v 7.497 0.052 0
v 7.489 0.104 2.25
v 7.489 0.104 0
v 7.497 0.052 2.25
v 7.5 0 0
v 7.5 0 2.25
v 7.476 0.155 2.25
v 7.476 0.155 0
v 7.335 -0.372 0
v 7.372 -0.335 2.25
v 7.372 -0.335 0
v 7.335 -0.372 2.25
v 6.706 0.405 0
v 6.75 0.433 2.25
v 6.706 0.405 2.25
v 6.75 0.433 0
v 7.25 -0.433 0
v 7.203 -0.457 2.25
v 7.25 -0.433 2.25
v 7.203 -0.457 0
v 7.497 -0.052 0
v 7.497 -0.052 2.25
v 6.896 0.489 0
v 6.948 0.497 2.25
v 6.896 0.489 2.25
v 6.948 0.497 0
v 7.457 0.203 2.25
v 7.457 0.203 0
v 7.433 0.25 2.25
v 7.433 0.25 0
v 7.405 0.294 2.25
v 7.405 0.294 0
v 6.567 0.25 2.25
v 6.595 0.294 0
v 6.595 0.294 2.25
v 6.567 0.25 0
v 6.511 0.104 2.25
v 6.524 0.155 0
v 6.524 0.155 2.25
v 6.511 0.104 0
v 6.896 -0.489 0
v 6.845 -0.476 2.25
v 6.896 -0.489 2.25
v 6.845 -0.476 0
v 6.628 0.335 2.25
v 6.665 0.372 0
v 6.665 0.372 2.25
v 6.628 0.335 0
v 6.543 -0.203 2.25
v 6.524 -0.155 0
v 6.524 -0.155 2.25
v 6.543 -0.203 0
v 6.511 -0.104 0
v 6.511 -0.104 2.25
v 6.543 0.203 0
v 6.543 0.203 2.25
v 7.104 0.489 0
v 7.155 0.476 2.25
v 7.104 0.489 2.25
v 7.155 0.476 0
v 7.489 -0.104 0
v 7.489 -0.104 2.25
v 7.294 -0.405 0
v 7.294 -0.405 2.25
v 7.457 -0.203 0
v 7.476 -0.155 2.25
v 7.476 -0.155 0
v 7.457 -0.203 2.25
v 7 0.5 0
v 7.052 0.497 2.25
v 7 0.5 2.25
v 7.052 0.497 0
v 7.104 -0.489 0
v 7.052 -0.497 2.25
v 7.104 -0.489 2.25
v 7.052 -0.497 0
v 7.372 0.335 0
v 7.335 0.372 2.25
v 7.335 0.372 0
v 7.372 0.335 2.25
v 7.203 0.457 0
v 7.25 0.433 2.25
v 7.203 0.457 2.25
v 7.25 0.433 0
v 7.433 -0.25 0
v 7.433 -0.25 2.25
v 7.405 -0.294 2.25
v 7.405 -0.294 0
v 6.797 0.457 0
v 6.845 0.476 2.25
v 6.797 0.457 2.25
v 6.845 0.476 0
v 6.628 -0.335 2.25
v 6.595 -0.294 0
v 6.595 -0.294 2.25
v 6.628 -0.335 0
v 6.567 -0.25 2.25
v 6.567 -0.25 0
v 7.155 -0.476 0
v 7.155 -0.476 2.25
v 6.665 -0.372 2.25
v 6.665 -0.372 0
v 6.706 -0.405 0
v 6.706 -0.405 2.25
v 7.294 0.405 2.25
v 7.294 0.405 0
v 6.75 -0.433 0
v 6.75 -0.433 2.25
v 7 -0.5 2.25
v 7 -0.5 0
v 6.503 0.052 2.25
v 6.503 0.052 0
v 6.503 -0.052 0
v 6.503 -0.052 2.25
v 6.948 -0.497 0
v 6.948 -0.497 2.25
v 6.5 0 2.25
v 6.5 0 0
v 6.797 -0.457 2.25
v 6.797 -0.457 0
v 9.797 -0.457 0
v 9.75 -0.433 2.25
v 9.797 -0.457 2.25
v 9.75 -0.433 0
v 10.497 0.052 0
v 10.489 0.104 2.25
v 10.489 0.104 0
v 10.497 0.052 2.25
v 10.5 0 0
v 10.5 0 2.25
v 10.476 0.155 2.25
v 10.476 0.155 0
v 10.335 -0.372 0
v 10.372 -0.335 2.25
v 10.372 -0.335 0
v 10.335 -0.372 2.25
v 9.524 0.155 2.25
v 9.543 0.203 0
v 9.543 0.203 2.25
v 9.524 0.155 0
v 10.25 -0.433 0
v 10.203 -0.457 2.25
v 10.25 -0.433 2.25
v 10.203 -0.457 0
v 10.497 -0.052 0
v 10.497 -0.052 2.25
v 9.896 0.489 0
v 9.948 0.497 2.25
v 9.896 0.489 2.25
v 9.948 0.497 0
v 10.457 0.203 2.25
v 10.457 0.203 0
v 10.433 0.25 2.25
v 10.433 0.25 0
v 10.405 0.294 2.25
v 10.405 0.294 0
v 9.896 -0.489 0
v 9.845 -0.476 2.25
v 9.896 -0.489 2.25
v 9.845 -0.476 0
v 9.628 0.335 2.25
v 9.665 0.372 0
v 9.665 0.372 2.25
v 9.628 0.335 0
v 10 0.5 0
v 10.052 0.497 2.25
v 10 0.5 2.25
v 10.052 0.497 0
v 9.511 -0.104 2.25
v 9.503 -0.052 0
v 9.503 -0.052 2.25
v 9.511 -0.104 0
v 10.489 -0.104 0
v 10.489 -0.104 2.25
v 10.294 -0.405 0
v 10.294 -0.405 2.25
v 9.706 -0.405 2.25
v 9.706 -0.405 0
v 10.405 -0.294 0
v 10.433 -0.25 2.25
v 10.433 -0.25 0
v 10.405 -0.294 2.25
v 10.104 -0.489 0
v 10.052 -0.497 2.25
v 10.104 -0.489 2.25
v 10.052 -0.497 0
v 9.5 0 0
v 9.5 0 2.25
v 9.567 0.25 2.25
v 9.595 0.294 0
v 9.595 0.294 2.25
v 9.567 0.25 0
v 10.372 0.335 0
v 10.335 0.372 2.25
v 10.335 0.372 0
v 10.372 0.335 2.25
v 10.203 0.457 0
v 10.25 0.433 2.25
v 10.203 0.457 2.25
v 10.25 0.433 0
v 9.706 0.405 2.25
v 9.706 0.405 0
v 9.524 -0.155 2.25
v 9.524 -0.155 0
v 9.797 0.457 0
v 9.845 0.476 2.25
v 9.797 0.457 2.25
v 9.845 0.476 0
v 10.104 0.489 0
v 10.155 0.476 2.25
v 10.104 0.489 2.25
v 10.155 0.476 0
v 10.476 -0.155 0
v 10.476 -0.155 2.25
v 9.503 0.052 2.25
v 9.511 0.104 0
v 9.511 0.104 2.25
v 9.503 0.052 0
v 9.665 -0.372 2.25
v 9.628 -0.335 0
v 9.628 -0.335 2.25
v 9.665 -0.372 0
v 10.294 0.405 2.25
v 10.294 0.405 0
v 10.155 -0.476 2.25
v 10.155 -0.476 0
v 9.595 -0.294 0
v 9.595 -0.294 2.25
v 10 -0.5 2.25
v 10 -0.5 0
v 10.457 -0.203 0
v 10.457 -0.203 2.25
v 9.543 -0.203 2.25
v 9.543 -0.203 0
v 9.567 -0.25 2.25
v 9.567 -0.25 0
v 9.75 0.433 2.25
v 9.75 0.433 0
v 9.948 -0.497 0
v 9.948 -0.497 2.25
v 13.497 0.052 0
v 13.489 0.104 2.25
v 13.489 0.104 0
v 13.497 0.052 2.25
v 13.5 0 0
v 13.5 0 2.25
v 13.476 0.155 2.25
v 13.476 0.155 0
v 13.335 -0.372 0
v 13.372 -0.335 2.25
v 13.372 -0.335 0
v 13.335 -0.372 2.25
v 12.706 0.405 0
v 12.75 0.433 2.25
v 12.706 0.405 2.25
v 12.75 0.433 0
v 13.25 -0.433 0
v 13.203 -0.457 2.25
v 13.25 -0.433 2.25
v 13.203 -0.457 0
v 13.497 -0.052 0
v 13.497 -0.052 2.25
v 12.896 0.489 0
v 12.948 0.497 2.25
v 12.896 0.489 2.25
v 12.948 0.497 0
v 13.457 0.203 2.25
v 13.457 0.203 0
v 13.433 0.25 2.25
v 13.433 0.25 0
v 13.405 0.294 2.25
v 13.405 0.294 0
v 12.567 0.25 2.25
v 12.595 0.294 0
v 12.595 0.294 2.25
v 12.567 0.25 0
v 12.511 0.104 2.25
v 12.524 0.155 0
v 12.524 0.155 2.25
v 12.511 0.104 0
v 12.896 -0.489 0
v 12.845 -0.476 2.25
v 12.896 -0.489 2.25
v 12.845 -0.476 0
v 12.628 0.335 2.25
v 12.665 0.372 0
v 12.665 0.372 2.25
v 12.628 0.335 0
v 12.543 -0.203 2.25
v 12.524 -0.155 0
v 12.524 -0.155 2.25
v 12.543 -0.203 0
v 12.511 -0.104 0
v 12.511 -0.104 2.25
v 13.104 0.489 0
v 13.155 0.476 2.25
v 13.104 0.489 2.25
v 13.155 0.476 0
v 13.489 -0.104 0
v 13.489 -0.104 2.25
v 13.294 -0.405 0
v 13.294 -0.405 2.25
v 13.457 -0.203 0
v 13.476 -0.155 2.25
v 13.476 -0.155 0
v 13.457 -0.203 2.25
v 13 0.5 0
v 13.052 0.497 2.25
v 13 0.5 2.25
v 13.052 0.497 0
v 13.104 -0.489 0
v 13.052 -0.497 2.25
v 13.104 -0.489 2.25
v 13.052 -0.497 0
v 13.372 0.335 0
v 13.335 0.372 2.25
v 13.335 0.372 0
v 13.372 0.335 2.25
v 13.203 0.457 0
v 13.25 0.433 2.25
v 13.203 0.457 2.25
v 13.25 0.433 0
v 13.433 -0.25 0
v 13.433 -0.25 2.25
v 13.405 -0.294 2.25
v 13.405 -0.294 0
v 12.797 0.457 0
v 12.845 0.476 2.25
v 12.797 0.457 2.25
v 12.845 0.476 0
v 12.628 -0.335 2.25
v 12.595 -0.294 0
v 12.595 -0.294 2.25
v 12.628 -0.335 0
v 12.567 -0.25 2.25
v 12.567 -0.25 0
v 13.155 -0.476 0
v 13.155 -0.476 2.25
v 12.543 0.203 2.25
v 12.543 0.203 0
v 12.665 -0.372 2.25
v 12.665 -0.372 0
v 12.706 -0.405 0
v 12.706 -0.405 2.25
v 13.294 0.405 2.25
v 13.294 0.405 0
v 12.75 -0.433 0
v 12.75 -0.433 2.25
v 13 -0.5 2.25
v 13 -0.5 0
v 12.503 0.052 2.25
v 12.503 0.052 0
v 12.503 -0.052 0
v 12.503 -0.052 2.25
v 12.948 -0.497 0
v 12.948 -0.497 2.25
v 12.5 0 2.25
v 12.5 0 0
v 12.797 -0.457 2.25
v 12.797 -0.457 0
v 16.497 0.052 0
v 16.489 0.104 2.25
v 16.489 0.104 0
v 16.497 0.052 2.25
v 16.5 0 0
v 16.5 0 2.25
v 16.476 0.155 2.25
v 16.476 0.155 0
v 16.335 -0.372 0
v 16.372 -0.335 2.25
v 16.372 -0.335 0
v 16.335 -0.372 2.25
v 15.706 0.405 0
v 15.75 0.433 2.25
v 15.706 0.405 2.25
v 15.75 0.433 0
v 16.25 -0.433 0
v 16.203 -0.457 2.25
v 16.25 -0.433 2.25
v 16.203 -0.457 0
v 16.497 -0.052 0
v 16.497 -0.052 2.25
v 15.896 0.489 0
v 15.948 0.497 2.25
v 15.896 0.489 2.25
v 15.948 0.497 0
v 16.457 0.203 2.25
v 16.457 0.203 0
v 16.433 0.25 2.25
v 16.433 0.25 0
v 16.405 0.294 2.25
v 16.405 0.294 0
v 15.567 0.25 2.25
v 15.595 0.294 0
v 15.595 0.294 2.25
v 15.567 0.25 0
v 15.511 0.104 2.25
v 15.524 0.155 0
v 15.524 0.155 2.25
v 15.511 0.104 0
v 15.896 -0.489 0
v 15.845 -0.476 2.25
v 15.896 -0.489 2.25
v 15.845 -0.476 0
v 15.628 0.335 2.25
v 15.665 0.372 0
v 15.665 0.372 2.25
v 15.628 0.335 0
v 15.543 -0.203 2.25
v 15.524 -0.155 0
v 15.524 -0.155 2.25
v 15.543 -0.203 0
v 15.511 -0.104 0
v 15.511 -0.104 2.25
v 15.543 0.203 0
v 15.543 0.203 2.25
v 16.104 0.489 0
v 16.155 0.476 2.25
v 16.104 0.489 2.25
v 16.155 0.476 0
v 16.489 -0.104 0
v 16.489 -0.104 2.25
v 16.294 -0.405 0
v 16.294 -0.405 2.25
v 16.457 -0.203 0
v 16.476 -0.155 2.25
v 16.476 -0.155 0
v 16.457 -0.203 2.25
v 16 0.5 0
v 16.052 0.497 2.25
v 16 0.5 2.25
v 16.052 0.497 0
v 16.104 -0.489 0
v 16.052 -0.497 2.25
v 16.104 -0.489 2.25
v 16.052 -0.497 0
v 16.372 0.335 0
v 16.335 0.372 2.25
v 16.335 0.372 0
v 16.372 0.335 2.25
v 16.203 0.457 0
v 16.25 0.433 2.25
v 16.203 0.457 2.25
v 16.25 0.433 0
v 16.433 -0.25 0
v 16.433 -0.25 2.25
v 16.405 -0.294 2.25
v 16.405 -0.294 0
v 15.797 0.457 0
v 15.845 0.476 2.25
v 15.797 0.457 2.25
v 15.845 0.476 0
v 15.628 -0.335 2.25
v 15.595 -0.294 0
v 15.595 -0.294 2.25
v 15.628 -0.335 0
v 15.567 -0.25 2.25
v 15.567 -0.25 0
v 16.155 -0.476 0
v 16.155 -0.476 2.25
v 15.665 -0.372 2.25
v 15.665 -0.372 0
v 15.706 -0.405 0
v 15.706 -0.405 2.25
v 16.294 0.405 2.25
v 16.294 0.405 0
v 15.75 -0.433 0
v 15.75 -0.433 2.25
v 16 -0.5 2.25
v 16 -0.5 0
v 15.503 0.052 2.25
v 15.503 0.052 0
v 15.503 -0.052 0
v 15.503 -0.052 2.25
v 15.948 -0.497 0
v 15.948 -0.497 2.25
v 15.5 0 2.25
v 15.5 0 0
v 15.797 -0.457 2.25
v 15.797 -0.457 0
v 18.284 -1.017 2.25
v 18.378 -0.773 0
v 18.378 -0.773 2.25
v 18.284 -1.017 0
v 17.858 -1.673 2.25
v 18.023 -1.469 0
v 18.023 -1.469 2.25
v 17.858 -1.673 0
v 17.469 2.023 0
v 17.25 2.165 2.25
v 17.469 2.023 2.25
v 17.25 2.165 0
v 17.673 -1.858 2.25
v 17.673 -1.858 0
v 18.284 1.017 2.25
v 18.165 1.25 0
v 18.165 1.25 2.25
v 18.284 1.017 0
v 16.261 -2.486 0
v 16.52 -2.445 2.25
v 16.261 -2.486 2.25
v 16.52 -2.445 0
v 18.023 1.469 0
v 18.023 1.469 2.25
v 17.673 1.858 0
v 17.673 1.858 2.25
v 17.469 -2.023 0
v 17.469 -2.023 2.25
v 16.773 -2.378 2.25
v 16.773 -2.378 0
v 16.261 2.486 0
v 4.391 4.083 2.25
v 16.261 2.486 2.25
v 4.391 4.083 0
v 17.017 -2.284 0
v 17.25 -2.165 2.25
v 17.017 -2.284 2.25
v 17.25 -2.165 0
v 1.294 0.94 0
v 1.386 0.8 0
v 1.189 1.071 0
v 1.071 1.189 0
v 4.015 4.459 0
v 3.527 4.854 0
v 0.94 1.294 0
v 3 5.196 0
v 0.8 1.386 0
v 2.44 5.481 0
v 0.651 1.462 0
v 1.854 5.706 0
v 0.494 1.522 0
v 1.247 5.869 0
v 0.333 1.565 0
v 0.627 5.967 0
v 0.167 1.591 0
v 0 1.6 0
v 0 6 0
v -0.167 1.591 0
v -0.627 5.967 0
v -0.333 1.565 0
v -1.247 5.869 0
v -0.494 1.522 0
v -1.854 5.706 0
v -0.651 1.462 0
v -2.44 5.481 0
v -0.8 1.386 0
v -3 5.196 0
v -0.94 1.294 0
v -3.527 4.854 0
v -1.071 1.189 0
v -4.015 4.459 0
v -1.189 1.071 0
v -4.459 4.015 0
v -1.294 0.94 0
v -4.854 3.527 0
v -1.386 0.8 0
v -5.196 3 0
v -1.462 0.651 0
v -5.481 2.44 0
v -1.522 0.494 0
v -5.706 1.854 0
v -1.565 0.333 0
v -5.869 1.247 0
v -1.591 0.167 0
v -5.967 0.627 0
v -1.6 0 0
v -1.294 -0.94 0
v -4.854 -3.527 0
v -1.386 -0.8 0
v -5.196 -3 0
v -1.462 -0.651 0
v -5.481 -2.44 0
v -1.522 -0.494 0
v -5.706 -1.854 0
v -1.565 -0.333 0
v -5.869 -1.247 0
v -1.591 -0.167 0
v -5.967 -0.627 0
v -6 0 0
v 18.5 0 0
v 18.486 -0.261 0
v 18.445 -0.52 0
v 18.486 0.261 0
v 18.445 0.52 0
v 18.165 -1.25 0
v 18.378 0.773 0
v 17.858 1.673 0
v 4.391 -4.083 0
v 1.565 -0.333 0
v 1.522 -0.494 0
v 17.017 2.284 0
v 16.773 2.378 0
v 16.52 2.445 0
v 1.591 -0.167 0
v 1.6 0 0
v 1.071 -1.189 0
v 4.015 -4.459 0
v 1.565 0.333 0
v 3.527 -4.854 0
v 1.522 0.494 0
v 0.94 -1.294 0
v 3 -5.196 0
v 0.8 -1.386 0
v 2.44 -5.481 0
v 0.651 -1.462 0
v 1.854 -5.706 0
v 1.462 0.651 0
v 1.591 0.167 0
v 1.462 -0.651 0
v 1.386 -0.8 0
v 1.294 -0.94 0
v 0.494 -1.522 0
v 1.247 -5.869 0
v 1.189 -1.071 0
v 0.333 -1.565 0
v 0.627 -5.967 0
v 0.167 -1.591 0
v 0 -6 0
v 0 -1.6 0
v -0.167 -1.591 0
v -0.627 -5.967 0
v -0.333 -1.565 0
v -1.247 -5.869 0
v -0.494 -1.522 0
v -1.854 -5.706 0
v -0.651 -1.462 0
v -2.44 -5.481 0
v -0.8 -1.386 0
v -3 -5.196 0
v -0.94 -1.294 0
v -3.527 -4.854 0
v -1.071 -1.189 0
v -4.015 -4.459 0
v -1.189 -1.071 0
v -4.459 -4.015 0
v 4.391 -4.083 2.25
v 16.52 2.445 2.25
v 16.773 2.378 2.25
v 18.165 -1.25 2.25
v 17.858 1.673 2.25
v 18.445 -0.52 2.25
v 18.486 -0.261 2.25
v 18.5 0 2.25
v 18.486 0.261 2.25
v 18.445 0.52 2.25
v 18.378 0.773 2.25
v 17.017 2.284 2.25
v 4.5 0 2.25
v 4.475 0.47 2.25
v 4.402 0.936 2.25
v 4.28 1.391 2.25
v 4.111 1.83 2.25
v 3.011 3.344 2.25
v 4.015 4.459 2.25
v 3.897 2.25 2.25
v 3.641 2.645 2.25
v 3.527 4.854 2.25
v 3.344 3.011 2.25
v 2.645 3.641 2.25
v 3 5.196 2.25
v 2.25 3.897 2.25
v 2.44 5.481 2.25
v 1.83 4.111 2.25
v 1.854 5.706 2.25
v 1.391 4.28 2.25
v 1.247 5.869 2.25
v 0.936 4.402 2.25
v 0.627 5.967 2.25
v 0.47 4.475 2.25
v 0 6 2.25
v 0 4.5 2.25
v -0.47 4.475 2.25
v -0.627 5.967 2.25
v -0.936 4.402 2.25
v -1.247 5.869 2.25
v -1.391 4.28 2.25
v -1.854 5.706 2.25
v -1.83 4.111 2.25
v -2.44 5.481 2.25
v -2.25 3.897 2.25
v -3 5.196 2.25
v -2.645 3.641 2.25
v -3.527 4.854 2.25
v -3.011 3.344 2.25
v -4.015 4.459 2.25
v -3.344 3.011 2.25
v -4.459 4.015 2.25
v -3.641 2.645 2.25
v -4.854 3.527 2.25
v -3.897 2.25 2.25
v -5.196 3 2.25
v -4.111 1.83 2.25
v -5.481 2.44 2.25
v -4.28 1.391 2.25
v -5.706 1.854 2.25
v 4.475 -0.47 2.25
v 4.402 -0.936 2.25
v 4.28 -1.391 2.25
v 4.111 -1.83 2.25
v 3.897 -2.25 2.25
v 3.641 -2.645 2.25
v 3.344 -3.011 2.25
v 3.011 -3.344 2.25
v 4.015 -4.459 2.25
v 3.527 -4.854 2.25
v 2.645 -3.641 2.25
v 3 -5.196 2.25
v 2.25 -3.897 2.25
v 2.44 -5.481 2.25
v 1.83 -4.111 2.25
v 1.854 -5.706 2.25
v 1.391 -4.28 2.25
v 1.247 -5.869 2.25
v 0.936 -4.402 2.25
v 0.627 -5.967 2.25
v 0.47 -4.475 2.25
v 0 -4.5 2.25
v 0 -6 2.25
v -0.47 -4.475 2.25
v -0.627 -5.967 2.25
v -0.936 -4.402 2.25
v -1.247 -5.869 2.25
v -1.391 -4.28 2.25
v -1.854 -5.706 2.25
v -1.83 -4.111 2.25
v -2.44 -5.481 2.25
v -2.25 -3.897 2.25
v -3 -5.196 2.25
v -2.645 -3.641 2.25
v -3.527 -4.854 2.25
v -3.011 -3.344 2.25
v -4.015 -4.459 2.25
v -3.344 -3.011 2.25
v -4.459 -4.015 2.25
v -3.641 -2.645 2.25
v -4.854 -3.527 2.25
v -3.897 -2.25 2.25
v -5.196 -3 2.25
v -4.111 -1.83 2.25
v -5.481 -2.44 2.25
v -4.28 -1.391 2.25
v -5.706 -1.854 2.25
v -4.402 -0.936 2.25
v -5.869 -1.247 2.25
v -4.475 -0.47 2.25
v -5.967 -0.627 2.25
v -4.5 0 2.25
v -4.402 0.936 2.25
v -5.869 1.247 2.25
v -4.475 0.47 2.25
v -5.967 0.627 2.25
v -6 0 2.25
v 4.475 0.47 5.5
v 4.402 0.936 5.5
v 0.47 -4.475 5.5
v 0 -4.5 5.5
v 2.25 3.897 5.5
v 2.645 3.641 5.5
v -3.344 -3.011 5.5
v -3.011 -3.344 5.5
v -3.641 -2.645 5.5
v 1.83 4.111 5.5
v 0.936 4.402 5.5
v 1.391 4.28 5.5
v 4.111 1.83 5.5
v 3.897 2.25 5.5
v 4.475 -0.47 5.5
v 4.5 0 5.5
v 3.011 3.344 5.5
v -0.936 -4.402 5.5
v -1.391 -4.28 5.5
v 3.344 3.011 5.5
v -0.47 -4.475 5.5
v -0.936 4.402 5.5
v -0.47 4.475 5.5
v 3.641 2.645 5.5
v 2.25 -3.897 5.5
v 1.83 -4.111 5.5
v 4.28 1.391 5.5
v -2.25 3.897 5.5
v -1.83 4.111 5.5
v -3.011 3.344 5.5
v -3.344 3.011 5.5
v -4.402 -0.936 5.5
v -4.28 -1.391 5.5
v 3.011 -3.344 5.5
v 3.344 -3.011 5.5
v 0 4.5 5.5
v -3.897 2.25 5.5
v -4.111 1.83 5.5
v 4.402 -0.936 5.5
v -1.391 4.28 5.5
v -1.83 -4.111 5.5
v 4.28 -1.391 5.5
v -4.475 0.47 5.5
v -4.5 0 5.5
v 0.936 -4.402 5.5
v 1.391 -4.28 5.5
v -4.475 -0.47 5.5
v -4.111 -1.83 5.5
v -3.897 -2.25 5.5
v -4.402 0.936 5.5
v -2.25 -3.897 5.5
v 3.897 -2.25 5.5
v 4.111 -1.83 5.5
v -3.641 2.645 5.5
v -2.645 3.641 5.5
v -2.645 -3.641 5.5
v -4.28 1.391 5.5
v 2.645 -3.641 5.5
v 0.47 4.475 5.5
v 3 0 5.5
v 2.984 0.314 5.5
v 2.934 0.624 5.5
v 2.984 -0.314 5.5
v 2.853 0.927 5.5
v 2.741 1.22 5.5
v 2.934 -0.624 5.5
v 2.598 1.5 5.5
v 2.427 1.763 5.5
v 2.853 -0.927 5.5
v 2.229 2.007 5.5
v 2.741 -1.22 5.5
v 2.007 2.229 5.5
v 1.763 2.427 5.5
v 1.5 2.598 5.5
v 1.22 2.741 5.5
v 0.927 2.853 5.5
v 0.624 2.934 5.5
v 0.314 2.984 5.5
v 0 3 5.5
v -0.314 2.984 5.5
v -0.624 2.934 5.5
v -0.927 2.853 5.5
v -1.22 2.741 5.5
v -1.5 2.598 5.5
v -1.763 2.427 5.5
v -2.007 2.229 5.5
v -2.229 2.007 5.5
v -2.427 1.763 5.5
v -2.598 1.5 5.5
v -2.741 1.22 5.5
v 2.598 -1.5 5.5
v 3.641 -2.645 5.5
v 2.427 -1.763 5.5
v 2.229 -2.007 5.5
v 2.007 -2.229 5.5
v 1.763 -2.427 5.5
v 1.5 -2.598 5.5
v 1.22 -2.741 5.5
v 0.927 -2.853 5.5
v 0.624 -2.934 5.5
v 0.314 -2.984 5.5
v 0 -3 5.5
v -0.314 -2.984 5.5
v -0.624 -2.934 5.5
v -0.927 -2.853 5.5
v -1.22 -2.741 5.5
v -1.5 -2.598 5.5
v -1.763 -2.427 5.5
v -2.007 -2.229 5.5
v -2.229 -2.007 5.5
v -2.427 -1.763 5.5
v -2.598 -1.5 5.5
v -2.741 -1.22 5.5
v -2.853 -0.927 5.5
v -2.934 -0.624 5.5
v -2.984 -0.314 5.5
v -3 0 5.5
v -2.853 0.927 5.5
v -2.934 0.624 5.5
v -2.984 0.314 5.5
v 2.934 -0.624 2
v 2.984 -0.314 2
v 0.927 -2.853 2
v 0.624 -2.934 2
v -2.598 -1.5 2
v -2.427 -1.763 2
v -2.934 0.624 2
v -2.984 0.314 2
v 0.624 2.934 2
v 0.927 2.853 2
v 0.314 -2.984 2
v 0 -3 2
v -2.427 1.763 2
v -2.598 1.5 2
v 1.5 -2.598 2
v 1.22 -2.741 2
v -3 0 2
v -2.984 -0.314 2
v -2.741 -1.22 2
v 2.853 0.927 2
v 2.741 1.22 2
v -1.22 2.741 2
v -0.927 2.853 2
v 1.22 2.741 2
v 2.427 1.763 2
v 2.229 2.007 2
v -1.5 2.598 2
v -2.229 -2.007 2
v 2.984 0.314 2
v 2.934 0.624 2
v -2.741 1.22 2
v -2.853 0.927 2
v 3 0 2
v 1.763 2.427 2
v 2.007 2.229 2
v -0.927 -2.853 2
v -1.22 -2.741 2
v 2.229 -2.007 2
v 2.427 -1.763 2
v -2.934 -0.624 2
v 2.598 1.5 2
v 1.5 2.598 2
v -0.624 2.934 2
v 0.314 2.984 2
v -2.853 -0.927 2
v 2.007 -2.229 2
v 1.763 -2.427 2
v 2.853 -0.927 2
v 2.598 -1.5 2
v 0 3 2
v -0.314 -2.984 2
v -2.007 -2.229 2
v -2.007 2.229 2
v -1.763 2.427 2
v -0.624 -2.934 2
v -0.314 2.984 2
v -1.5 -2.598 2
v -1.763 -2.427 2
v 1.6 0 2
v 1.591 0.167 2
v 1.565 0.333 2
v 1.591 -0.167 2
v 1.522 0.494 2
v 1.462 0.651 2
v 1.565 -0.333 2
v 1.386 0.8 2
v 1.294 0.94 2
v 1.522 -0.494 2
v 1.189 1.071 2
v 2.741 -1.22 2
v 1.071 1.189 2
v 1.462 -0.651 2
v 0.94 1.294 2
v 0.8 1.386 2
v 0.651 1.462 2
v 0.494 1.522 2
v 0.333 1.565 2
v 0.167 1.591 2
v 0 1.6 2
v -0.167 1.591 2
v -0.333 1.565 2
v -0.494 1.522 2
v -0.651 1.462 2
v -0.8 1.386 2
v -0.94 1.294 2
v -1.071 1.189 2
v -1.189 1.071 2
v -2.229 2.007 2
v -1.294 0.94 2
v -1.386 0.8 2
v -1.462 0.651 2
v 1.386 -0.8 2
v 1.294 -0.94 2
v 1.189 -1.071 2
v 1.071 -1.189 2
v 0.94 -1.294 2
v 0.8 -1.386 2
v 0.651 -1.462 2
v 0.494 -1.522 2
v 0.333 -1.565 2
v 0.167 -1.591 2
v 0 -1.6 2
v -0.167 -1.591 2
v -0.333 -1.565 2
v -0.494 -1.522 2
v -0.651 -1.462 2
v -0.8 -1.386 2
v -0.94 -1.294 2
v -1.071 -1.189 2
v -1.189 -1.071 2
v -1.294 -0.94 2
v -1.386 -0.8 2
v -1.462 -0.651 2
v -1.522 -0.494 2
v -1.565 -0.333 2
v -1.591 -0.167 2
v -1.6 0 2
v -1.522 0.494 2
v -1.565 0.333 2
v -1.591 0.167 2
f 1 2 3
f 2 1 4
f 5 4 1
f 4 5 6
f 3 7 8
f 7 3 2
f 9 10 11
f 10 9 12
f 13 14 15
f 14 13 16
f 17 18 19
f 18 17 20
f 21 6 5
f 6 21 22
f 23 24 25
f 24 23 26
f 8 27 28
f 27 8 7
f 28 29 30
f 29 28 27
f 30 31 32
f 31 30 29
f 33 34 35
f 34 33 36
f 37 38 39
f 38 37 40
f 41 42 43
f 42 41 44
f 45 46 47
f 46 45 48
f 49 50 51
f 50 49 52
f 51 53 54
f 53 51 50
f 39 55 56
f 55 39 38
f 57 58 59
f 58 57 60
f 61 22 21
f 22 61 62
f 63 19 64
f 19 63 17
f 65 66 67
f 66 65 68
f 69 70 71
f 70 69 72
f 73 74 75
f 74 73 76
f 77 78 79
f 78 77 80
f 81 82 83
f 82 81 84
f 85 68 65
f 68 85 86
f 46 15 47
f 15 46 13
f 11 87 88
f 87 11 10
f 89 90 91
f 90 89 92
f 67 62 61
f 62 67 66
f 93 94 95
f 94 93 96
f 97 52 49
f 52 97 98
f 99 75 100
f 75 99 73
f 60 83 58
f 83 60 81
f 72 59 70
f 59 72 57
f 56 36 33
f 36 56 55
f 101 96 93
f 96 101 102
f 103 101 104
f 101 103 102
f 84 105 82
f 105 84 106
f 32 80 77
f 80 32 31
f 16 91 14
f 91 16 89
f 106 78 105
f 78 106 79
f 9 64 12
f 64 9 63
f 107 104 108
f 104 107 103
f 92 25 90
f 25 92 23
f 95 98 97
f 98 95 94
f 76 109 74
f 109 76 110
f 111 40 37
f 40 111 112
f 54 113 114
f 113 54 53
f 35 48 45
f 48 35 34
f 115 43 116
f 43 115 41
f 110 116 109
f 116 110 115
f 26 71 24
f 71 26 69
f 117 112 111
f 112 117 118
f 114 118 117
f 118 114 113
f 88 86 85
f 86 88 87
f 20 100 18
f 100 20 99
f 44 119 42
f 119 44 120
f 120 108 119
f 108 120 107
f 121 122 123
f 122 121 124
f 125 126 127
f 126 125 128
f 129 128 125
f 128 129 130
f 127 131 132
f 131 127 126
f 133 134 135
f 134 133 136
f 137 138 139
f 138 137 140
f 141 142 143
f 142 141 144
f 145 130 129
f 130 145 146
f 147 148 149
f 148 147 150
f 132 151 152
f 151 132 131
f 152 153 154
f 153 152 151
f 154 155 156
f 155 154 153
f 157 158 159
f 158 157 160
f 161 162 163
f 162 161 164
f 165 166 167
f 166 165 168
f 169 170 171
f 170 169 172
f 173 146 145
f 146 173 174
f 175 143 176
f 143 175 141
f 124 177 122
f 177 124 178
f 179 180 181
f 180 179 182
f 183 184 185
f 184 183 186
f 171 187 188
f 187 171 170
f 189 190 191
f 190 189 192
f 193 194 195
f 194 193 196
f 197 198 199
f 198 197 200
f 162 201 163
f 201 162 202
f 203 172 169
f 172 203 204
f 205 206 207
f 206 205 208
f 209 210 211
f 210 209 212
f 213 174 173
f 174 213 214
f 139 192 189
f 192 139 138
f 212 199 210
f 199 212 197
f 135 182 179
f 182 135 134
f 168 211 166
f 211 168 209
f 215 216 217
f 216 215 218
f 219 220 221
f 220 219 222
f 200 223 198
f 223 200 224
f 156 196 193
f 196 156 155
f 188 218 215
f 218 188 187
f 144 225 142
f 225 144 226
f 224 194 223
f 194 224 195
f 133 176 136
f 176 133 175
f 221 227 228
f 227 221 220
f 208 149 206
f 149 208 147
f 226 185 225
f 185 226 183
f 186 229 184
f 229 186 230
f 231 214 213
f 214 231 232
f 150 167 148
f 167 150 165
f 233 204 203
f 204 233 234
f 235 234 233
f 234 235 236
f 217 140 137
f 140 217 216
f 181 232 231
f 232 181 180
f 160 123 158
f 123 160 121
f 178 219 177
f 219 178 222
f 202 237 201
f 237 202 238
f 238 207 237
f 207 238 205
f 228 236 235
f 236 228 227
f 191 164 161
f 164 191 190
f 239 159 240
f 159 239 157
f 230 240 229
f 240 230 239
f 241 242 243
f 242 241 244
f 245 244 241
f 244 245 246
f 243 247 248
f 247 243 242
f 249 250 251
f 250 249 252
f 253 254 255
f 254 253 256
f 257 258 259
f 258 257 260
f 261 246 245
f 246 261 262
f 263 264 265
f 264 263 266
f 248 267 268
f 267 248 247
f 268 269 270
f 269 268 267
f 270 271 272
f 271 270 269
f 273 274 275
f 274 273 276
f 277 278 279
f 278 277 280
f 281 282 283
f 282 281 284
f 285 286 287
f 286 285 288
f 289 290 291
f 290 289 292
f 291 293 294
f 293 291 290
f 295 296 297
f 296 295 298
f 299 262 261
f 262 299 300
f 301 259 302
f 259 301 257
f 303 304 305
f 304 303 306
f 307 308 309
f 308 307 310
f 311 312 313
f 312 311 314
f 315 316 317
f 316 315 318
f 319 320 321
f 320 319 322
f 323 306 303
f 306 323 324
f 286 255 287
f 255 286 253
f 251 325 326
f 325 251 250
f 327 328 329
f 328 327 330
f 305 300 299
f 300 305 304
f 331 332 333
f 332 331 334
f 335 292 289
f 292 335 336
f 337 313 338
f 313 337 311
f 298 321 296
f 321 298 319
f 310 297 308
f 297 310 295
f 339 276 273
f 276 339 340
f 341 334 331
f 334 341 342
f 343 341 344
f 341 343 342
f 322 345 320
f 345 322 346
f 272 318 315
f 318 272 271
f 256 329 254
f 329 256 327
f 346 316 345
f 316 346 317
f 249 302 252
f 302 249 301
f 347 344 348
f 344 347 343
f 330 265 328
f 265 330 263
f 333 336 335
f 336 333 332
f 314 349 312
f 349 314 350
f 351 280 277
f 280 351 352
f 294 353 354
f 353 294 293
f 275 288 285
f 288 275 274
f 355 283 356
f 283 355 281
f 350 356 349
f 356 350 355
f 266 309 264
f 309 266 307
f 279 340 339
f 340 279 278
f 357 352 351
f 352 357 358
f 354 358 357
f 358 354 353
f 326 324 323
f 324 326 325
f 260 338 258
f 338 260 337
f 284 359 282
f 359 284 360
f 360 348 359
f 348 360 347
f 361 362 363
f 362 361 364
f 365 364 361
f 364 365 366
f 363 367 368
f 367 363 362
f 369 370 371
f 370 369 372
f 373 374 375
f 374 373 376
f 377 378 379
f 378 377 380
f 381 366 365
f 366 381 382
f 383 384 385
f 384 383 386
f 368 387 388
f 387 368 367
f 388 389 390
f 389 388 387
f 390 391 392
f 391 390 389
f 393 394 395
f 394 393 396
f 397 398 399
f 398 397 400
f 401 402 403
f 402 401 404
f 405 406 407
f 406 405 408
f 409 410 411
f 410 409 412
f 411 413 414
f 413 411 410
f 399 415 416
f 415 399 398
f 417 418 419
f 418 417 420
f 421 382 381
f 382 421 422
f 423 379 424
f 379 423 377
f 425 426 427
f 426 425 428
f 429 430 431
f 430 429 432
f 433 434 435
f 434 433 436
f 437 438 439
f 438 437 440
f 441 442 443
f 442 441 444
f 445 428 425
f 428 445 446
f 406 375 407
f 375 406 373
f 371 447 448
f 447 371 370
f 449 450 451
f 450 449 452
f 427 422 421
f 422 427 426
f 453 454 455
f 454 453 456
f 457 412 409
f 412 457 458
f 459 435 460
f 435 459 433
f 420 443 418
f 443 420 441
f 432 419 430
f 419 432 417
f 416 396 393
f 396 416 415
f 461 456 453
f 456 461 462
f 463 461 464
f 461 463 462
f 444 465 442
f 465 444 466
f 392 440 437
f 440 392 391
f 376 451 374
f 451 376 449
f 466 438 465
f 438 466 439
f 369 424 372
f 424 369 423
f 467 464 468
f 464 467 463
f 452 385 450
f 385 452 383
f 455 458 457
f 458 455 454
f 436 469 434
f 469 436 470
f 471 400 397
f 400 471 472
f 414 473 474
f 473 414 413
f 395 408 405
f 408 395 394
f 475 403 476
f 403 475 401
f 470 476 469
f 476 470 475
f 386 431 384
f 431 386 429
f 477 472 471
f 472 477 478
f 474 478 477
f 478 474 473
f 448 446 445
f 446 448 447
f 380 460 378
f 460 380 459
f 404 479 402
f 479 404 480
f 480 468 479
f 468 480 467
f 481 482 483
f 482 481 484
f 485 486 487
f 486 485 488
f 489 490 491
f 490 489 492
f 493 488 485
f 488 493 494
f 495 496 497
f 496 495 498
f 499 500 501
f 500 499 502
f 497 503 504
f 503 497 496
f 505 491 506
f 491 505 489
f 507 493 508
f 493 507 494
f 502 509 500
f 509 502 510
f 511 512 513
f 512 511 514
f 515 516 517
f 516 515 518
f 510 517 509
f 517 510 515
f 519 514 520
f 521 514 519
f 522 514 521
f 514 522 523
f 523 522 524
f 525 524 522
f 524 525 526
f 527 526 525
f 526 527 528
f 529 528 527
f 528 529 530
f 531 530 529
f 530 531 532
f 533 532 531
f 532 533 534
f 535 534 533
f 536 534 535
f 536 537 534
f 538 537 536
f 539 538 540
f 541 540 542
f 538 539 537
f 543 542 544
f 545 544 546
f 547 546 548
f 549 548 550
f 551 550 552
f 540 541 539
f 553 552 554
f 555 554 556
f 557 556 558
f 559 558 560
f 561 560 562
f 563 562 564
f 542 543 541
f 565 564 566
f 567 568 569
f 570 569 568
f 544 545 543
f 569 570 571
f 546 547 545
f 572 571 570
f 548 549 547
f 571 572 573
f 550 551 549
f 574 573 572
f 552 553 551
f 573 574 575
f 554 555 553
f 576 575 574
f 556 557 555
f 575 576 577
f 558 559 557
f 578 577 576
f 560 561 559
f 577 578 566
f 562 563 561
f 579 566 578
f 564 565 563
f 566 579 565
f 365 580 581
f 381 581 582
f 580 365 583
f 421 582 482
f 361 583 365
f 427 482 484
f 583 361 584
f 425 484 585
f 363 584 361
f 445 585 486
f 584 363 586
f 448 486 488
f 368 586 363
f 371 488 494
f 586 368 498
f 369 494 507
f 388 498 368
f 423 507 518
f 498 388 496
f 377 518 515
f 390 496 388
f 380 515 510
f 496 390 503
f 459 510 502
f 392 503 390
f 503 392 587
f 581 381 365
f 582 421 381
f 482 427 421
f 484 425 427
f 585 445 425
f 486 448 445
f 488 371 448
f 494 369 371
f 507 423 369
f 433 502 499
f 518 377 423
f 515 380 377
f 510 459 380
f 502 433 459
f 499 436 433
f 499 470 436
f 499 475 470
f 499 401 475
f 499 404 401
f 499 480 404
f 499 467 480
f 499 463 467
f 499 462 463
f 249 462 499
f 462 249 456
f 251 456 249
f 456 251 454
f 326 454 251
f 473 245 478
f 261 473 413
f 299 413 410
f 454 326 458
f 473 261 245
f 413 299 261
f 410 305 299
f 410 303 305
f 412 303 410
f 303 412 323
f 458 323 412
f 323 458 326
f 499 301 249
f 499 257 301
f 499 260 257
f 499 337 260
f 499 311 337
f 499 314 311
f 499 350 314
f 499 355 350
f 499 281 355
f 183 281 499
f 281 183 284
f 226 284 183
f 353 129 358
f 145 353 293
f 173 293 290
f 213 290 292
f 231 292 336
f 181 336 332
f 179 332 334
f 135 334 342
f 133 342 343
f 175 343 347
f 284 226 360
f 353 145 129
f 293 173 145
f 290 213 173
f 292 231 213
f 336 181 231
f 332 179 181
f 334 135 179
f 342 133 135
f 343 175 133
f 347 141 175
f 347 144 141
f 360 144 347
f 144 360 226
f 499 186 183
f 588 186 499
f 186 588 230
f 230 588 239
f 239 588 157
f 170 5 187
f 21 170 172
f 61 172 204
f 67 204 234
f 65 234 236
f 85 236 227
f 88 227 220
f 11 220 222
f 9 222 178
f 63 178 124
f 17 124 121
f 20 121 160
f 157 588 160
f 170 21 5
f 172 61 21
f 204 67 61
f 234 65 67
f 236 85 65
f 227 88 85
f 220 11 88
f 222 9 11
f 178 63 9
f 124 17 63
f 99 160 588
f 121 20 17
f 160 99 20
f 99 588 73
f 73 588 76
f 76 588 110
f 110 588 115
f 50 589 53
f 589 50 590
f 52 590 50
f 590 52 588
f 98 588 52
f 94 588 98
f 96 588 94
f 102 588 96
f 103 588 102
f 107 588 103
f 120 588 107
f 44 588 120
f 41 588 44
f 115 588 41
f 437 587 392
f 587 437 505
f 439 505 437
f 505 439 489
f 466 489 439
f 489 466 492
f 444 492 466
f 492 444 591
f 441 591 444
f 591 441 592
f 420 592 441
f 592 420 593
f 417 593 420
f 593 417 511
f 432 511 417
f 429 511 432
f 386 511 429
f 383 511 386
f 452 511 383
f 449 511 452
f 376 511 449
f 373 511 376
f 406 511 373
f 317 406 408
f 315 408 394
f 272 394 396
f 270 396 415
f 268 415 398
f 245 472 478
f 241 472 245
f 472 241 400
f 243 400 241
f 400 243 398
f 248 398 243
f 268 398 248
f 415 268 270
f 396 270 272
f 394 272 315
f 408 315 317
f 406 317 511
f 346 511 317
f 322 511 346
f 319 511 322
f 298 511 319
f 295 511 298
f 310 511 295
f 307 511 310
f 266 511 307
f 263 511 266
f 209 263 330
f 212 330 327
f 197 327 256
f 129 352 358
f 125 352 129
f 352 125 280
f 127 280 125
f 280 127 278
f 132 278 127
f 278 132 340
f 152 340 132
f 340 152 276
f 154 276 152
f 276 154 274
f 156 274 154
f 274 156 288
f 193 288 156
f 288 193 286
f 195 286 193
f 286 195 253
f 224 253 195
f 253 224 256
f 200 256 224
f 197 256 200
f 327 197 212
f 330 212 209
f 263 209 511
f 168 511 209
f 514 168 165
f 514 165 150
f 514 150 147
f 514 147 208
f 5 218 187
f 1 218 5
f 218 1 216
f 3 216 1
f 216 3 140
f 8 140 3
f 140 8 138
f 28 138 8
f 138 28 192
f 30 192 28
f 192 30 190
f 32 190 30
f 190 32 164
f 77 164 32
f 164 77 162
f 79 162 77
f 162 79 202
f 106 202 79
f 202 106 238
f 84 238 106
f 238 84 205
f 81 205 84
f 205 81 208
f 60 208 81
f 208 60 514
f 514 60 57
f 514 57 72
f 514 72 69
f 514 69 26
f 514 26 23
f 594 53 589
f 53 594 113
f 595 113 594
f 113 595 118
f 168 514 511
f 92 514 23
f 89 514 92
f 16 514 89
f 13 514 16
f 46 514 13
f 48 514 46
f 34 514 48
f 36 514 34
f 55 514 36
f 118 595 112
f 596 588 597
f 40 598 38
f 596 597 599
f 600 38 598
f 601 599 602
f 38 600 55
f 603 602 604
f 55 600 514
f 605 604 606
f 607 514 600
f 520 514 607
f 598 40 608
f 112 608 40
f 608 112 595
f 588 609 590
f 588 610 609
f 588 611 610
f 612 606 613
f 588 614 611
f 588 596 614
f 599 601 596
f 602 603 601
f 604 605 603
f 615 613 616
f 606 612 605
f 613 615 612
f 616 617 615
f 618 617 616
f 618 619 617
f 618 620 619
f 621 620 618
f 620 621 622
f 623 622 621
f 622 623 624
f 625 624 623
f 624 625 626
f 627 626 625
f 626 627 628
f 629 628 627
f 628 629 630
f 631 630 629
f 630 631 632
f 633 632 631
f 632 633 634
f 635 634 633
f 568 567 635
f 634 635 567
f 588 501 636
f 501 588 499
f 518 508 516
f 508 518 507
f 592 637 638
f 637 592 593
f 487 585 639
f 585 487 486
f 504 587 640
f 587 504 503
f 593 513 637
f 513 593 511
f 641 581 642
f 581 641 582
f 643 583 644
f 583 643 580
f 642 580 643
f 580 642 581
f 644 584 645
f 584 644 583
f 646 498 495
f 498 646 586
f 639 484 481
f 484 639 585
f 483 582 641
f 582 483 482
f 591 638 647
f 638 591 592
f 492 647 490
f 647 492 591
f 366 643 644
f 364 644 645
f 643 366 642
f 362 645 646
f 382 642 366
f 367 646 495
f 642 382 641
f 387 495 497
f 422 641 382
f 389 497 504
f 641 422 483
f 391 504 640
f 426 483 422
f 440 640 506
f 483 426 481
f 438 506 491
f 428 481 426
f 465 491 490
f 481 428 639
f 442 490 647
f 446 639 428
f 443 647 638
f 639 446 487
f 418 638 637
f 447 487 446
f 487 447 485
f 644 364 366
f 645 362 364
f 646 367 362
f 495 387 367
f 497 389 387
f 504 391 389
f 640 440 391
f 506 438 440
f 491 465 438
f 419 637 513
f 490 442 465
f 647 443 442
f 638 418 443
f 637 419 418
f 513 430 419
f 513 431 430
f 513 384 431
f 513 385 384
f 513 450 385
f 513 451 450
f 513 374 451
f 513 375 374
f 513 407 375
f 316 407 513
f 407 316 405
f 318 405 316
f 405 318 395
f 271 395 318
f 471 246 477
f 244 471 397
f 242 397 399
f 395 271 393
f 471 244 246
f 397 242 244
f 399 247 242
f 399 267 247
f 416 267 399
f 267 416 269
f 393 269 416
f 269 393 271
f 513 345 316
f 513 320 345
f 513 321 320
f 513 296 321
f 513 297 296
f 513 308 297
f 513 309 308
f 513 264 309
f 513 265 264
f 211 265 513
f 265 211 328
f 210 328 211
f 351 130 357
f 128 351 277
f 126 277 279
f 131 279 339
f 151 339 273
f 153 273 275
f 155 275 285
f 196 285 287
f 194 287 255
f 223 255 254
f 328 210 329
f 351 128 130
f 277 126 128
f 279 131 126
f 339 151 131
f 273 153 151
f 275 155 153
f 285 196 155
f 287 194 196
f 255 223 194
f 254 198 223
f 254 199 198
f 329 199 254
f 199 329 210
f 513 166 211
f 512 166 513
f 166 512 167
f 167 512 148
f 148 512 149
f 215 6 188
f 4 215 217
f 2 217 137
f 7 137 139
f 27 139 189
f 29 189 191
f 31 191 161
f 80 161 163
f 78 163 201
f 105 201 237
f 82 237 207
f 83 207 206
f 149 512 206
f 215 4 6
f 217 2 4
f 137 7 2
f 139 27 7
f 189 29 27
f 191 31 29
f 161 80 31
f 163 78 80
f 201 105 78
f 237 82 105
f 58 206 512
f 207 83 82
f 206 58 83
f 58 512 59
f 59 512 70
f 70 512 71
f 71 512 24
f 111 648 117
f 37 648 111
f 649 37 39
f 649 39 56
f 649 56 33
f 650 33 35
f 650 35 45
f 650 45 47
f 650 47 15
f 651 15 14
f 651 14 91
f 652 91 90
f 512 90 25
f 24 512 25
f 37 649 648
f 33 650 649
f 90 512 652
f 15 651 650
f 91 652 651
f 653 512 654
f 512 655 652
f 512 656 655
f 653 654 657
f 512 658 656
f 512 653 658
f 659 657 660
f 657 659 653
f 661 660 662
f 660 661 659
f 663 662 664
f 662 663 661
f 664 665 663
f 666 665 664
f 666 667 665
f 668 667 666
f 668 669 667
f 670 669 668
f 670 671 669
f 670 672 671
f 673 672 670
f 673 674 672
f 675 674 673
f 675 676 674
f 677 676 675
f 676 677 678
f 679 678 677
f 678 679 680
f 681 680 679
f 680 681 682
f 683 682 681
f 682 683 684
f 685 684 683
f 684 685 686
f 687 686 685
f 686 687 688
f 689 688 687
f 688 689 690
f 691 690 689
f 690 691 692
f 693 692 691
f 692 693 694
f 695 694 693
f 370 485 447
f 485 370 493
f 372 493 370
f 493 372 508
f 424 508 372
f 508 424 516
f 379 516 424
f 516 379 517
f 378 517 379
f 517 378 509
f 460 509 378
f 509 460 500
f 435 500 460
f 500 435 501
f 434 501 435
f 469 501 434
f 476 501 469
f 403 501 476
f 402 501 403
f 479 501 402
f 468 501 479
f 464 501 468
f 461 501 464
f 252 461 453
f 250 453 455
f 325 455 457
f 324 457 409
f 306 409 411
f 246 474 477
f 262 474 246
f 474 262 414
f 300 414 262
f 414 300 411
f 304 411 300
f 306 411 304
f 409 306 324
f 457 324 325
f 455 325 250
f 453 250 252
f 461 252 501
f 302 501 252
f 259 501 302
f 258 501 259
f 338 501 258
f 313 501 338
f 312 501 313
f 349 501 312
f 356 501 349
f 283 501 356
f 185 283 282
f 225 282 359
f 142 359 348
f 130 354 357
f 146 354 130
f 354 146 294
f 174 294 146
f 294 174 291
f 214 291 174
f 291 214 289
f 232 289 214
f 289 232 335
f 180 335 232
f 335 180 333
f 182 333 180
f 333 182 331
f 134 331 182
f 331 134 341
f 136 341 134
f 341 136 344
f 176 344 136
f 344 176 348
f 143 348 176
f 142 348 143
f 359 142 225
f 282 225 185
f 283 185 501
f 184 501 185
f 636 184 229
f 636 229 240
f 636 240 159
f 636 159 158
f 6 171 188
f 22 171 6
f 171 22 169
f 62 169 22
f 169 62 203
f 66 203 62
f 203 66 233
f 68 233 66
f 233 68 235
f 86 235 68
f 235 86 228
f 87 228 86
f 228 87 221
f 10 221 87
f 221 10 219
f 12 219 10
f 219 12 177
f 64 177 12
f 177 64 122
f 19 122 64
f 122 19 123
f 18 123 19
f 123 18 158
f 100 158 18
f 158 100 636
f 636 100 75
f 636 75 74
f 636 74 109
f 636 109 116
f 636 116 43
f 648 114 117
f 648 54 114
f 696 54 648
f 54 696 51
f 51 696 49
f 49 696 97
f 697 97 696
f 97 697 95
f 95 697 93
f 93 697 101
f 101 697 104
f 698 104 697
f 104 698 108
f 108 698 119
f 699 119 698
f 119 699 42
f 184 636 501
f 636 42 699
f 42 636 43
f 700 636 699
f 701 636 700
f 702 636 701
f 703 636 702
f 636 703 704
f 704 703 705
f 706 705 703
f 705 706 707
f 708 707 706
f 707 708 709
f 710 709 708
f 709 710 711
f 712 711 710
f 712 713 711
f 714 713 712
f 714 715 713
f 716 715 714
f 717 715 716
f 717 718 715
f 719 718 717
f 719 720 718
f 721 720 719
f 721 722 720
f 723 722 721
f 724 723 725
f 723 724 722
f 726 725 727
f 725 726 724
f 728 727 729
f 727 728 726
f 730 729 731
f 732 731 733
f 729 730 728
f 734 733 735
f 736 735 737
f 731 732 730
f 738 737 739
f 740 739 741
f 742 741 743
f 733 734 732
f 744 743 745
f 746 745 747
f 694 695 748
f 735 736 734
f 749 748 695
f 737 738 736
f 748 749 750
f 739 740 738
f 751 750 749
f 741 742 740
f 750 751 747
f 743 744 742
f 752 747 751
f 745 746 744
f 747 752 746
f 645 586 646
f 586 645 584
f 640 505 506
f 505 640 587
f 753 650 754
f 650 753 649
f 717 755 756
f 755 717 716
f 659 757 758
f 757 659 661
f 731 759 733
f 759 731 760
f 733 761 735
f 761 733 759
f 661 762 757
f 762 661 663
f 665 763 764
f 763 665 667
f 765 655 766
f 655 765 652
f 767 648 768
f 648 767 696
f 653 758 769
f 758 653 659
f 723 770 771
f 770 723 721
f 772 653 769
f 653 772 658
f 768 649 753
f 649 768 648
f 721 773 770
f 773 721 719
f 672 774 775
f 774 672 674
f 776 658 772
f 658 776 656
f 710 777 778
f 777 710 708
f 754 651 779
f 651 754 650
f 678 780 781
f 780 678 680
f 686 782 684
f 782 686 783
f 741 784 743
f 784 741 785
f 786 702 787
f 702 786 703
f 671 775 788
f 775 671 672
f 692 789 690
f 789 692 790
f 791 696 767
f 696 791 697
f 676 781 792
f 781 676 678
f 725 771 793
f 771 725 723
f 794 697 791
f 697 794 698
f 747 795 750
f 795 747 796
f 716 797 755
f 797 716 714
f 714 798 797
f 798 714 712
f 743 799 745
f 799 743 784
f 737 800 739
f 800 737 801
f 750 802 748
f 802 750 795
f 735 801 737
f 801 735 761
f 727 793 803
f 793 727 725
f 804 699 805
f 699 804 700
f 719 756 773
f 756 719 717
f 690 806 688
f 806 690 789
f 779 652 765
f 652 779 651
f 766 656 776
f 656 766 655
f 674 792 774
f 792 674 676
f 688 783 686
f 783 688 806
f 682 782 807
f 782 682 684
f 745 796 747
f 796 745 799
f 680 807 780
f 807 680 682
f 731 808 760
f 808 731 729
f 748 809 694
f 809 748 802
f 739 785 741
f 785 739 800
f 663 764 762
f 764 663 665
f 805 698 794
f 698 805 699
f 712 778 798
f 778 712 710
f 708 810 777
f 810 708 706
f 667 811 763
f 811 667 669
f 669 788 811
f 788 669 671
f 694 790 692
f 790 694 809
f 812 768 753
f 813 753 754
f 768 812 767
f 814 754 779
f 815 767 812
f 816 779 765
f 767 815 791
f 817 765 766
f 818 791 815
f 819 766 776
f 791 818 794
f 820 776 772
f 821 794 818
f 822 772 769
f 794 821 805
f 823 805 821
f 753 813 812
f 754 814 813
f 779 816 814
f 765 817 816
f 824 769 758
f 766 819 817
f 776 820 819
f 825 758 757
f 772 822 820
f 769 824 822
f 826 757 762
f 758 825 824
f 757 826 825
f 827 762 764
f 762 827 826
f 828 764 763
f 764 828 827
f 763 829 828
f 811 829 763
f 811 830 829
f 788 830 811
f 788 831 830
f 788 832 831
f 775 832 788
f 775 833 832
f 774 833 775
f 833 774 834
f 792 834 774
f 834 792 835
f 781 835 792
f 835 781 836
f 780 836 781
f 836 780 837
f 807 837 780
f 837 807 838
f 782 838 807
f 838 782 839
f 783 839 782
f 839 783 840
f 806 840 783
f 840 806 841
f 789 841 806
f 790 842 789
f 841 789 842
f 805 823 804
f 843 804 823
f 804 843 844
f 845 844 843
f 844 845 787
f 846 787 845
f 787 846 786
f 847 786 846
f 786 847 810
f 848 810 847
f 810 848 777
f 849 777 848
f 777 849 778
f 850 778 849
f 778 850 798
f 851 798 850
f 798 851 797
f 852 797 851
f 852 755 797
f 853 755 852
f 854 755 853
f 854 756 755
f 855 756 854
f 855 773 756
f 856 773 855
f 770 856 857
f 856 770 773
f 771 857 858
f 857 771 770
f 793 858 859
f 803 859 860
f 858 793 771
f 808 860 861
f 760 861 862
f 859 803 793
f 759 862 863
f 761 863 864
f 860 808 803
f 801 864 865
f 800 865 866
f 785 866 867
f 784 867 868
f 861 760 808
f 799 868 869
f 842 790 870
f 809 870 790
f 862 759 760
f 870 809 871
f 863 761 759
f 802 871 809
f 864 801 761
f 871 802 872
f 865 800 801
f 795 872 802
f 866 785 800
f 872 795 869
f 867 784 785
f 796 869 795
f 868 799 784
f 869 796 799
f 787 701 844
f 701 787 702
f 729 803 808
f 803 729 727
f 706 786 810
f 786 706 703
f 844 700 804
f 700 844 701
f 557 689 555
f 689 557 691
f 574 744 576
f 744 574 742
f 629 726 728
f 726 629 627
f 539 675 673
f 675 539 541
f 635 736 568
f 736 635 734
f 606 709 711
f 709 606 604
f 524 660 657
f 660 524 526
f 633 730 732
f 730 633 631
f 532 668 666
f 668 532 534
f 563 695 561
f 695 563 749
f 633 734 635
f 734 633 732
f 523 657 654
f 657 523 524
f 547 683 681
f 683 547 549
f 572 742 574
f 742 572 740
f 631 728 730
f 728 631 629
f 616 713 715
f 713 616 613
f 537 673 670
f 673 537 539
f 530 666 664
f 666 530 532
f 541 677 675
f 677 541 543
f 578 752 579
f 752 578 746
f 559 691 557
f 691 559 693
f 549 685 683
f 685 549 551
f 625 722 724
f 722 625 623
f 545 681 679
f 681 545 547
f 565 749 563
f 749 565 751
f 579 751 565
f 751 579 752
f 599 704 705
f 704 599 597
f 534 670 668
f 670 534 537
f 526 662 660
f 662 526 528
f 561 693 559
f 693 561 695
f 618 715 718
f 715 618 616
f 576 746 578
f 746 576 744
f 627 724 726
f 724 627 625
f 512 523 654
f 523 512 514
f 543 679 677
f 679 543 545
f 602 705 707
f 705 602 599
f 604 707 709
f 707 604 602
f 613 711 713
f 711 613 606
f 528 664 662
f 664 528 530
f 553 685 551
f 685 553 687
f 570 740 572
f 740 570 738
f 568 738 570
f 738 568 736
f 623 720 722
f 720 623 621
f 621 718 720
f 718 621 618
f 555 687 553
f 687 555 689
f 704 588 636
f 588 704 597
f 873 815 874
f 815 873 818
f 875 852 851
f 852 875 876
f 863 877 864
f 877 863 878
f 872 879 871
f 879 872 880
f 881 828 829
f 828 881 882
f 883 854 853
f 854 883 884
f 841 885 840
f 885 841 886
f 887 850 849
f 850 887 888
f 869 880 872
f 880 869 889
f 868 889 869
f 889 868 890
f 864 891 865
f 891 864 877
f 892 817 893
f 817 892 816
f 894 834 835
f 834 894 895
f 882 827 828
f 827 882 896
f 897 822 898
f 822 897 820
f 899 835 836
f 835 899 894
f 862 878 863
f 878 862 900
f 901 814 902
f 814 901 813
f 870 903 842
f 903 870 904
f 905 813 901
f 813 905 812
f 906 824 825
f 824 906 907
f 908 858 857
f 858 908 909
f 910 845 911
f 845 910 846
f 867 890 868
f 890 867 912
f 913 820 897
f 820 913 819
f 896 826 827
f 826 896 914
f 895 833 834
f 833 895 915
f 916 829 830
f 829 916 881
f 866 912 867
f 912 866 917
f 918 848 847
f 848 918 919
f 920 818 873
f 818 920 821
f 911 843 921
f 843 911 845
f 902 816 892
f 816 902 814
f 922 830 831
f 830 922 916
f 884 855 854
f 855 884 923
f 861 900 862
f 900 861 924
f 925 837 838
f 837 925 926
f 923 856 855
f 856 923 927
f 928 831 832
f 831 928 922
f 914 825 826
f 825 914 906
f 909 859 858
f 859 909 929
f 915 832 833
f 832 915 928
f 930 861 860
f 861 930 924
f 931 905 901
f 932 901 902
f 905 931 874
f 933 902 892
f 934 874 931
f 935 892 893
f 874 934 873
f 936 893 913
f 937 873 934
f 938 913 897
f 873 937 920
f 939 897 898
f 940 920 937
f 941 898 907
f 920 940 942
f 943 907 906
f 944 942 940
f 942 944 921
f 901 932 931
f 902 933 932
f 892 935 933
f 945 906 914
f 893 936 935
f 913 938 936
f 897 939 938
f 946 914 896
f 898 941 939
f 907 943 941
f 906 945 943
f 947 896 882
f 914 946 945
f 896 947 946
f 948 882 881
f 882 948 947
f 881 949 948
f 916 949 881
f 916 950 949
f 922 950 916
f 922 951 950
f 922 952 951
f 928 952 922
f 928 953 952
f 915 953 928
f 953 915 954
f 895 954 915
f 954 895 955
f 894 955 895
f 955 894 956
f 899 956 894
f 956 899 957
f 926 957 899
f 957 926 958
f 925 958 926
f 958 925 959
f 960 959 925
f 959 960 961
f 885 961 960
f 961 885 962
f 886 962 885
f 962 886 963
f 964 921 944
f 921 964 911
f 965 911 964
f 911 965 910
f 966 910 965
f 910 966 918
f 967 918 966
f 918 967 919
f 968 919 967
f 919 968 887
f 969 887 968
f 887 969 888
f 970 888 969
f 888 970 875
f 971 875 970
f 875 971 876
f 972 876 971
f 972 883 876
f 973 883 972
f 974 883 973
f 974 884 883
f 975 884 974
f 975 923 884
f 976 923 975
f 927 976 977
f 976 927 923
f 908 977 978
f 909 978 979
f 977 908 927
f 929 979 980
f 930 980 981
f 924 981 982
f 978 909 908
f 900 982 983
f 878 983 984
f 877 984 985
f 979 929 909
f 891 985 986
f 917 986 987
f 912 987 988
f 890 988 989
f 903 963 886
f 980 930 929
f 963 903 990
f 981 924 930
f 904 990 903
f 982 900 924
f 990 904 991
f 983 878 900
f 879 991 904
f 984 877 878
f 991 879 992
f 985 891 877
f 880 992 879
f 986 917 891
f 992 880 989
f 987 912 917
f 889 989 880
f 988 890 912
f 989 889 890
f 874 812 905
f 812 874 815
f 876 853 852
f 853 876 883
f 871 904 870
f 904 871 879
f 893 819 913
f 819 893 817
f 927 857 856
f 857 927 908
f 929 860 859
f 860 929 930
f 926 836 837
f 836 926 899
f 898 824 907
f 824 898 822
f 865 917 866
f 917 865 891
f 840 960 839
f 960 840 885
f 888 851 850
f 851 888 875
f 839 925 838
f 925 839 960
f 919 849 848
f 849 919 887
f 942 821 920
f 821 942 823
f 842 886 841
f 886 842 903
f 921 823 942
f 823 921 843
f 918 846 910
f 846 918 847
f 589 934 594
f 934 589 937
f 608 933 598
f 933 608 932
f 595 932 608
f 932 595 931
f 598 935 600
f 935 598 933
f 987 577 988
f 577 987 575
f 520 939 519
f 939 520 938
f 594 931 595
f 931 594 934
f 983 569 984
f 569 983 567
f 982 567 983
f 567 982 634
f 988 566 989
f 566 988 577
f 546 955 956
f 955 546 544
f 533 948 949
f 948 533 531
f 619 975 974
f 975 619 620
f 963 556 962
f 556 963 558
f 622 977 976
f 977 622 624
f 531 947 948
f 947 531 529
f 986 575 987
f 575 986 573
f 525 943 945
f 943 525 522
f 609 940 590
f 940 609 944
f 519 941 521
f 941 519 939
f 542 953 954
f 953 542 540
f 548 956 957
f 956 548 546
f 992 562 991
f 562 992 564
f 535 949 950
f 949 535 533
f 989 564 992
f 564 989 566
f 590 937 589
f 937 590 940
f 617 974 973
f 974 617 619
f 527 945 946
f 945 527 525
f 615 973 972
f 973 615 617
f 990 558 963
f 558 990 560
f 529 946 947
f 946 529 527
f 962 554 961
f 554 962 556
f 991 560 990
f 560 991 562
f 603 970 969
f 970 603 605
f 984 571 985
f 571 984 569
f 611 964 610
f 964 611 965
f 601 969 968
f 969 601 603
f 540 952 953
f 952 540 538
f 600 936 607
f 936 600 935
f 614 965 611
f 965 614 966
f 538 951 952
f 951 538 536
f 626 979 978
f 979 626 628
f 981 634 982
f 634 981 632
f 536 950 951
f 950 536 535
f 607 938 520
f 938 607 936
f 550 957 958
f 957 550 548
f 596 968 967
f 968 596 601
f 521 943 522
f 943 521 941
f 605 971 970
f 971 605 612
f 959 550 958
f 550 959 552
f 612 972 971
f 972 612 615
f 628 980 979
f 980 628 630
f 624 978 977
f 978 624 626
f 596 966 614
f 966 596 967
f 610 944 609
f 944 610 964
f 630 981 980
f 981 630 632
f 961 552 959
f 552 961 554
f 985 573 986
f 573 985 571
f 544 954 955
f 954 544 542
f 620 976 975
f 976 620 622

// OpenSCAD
$fn = 60;

legs = 1; // [1:1:10]
leg_holes = true;

module leg(holes) {
  difference() {
    translate([1, 0, 0]) hull() {
      cylinder(h=2.25, r=4.5);
      translate([15, 0, 0]) cylinder(h=2.25, r=2.5);
    }
    if(holes) {
      for(h=[7:3:18]) {
        translate([h, 0, -.1]) cylinder(r=0.5, h=20);
      }
    }
  }
}

difference() {
  union() {
    cylinder(h=5.5, r=4.5);
    cylinder(h=2.25, r=6);
    for(i=[0:360/legs:360]) {
        rotate([0, 0, i]) leg(leg_holes);
    }
  }
  translate([0, 0, 2]) cylinder(h=5.6, r=3);
  translate([0, 0, -.1]) cylinder(h=6, r=1.6);
}
